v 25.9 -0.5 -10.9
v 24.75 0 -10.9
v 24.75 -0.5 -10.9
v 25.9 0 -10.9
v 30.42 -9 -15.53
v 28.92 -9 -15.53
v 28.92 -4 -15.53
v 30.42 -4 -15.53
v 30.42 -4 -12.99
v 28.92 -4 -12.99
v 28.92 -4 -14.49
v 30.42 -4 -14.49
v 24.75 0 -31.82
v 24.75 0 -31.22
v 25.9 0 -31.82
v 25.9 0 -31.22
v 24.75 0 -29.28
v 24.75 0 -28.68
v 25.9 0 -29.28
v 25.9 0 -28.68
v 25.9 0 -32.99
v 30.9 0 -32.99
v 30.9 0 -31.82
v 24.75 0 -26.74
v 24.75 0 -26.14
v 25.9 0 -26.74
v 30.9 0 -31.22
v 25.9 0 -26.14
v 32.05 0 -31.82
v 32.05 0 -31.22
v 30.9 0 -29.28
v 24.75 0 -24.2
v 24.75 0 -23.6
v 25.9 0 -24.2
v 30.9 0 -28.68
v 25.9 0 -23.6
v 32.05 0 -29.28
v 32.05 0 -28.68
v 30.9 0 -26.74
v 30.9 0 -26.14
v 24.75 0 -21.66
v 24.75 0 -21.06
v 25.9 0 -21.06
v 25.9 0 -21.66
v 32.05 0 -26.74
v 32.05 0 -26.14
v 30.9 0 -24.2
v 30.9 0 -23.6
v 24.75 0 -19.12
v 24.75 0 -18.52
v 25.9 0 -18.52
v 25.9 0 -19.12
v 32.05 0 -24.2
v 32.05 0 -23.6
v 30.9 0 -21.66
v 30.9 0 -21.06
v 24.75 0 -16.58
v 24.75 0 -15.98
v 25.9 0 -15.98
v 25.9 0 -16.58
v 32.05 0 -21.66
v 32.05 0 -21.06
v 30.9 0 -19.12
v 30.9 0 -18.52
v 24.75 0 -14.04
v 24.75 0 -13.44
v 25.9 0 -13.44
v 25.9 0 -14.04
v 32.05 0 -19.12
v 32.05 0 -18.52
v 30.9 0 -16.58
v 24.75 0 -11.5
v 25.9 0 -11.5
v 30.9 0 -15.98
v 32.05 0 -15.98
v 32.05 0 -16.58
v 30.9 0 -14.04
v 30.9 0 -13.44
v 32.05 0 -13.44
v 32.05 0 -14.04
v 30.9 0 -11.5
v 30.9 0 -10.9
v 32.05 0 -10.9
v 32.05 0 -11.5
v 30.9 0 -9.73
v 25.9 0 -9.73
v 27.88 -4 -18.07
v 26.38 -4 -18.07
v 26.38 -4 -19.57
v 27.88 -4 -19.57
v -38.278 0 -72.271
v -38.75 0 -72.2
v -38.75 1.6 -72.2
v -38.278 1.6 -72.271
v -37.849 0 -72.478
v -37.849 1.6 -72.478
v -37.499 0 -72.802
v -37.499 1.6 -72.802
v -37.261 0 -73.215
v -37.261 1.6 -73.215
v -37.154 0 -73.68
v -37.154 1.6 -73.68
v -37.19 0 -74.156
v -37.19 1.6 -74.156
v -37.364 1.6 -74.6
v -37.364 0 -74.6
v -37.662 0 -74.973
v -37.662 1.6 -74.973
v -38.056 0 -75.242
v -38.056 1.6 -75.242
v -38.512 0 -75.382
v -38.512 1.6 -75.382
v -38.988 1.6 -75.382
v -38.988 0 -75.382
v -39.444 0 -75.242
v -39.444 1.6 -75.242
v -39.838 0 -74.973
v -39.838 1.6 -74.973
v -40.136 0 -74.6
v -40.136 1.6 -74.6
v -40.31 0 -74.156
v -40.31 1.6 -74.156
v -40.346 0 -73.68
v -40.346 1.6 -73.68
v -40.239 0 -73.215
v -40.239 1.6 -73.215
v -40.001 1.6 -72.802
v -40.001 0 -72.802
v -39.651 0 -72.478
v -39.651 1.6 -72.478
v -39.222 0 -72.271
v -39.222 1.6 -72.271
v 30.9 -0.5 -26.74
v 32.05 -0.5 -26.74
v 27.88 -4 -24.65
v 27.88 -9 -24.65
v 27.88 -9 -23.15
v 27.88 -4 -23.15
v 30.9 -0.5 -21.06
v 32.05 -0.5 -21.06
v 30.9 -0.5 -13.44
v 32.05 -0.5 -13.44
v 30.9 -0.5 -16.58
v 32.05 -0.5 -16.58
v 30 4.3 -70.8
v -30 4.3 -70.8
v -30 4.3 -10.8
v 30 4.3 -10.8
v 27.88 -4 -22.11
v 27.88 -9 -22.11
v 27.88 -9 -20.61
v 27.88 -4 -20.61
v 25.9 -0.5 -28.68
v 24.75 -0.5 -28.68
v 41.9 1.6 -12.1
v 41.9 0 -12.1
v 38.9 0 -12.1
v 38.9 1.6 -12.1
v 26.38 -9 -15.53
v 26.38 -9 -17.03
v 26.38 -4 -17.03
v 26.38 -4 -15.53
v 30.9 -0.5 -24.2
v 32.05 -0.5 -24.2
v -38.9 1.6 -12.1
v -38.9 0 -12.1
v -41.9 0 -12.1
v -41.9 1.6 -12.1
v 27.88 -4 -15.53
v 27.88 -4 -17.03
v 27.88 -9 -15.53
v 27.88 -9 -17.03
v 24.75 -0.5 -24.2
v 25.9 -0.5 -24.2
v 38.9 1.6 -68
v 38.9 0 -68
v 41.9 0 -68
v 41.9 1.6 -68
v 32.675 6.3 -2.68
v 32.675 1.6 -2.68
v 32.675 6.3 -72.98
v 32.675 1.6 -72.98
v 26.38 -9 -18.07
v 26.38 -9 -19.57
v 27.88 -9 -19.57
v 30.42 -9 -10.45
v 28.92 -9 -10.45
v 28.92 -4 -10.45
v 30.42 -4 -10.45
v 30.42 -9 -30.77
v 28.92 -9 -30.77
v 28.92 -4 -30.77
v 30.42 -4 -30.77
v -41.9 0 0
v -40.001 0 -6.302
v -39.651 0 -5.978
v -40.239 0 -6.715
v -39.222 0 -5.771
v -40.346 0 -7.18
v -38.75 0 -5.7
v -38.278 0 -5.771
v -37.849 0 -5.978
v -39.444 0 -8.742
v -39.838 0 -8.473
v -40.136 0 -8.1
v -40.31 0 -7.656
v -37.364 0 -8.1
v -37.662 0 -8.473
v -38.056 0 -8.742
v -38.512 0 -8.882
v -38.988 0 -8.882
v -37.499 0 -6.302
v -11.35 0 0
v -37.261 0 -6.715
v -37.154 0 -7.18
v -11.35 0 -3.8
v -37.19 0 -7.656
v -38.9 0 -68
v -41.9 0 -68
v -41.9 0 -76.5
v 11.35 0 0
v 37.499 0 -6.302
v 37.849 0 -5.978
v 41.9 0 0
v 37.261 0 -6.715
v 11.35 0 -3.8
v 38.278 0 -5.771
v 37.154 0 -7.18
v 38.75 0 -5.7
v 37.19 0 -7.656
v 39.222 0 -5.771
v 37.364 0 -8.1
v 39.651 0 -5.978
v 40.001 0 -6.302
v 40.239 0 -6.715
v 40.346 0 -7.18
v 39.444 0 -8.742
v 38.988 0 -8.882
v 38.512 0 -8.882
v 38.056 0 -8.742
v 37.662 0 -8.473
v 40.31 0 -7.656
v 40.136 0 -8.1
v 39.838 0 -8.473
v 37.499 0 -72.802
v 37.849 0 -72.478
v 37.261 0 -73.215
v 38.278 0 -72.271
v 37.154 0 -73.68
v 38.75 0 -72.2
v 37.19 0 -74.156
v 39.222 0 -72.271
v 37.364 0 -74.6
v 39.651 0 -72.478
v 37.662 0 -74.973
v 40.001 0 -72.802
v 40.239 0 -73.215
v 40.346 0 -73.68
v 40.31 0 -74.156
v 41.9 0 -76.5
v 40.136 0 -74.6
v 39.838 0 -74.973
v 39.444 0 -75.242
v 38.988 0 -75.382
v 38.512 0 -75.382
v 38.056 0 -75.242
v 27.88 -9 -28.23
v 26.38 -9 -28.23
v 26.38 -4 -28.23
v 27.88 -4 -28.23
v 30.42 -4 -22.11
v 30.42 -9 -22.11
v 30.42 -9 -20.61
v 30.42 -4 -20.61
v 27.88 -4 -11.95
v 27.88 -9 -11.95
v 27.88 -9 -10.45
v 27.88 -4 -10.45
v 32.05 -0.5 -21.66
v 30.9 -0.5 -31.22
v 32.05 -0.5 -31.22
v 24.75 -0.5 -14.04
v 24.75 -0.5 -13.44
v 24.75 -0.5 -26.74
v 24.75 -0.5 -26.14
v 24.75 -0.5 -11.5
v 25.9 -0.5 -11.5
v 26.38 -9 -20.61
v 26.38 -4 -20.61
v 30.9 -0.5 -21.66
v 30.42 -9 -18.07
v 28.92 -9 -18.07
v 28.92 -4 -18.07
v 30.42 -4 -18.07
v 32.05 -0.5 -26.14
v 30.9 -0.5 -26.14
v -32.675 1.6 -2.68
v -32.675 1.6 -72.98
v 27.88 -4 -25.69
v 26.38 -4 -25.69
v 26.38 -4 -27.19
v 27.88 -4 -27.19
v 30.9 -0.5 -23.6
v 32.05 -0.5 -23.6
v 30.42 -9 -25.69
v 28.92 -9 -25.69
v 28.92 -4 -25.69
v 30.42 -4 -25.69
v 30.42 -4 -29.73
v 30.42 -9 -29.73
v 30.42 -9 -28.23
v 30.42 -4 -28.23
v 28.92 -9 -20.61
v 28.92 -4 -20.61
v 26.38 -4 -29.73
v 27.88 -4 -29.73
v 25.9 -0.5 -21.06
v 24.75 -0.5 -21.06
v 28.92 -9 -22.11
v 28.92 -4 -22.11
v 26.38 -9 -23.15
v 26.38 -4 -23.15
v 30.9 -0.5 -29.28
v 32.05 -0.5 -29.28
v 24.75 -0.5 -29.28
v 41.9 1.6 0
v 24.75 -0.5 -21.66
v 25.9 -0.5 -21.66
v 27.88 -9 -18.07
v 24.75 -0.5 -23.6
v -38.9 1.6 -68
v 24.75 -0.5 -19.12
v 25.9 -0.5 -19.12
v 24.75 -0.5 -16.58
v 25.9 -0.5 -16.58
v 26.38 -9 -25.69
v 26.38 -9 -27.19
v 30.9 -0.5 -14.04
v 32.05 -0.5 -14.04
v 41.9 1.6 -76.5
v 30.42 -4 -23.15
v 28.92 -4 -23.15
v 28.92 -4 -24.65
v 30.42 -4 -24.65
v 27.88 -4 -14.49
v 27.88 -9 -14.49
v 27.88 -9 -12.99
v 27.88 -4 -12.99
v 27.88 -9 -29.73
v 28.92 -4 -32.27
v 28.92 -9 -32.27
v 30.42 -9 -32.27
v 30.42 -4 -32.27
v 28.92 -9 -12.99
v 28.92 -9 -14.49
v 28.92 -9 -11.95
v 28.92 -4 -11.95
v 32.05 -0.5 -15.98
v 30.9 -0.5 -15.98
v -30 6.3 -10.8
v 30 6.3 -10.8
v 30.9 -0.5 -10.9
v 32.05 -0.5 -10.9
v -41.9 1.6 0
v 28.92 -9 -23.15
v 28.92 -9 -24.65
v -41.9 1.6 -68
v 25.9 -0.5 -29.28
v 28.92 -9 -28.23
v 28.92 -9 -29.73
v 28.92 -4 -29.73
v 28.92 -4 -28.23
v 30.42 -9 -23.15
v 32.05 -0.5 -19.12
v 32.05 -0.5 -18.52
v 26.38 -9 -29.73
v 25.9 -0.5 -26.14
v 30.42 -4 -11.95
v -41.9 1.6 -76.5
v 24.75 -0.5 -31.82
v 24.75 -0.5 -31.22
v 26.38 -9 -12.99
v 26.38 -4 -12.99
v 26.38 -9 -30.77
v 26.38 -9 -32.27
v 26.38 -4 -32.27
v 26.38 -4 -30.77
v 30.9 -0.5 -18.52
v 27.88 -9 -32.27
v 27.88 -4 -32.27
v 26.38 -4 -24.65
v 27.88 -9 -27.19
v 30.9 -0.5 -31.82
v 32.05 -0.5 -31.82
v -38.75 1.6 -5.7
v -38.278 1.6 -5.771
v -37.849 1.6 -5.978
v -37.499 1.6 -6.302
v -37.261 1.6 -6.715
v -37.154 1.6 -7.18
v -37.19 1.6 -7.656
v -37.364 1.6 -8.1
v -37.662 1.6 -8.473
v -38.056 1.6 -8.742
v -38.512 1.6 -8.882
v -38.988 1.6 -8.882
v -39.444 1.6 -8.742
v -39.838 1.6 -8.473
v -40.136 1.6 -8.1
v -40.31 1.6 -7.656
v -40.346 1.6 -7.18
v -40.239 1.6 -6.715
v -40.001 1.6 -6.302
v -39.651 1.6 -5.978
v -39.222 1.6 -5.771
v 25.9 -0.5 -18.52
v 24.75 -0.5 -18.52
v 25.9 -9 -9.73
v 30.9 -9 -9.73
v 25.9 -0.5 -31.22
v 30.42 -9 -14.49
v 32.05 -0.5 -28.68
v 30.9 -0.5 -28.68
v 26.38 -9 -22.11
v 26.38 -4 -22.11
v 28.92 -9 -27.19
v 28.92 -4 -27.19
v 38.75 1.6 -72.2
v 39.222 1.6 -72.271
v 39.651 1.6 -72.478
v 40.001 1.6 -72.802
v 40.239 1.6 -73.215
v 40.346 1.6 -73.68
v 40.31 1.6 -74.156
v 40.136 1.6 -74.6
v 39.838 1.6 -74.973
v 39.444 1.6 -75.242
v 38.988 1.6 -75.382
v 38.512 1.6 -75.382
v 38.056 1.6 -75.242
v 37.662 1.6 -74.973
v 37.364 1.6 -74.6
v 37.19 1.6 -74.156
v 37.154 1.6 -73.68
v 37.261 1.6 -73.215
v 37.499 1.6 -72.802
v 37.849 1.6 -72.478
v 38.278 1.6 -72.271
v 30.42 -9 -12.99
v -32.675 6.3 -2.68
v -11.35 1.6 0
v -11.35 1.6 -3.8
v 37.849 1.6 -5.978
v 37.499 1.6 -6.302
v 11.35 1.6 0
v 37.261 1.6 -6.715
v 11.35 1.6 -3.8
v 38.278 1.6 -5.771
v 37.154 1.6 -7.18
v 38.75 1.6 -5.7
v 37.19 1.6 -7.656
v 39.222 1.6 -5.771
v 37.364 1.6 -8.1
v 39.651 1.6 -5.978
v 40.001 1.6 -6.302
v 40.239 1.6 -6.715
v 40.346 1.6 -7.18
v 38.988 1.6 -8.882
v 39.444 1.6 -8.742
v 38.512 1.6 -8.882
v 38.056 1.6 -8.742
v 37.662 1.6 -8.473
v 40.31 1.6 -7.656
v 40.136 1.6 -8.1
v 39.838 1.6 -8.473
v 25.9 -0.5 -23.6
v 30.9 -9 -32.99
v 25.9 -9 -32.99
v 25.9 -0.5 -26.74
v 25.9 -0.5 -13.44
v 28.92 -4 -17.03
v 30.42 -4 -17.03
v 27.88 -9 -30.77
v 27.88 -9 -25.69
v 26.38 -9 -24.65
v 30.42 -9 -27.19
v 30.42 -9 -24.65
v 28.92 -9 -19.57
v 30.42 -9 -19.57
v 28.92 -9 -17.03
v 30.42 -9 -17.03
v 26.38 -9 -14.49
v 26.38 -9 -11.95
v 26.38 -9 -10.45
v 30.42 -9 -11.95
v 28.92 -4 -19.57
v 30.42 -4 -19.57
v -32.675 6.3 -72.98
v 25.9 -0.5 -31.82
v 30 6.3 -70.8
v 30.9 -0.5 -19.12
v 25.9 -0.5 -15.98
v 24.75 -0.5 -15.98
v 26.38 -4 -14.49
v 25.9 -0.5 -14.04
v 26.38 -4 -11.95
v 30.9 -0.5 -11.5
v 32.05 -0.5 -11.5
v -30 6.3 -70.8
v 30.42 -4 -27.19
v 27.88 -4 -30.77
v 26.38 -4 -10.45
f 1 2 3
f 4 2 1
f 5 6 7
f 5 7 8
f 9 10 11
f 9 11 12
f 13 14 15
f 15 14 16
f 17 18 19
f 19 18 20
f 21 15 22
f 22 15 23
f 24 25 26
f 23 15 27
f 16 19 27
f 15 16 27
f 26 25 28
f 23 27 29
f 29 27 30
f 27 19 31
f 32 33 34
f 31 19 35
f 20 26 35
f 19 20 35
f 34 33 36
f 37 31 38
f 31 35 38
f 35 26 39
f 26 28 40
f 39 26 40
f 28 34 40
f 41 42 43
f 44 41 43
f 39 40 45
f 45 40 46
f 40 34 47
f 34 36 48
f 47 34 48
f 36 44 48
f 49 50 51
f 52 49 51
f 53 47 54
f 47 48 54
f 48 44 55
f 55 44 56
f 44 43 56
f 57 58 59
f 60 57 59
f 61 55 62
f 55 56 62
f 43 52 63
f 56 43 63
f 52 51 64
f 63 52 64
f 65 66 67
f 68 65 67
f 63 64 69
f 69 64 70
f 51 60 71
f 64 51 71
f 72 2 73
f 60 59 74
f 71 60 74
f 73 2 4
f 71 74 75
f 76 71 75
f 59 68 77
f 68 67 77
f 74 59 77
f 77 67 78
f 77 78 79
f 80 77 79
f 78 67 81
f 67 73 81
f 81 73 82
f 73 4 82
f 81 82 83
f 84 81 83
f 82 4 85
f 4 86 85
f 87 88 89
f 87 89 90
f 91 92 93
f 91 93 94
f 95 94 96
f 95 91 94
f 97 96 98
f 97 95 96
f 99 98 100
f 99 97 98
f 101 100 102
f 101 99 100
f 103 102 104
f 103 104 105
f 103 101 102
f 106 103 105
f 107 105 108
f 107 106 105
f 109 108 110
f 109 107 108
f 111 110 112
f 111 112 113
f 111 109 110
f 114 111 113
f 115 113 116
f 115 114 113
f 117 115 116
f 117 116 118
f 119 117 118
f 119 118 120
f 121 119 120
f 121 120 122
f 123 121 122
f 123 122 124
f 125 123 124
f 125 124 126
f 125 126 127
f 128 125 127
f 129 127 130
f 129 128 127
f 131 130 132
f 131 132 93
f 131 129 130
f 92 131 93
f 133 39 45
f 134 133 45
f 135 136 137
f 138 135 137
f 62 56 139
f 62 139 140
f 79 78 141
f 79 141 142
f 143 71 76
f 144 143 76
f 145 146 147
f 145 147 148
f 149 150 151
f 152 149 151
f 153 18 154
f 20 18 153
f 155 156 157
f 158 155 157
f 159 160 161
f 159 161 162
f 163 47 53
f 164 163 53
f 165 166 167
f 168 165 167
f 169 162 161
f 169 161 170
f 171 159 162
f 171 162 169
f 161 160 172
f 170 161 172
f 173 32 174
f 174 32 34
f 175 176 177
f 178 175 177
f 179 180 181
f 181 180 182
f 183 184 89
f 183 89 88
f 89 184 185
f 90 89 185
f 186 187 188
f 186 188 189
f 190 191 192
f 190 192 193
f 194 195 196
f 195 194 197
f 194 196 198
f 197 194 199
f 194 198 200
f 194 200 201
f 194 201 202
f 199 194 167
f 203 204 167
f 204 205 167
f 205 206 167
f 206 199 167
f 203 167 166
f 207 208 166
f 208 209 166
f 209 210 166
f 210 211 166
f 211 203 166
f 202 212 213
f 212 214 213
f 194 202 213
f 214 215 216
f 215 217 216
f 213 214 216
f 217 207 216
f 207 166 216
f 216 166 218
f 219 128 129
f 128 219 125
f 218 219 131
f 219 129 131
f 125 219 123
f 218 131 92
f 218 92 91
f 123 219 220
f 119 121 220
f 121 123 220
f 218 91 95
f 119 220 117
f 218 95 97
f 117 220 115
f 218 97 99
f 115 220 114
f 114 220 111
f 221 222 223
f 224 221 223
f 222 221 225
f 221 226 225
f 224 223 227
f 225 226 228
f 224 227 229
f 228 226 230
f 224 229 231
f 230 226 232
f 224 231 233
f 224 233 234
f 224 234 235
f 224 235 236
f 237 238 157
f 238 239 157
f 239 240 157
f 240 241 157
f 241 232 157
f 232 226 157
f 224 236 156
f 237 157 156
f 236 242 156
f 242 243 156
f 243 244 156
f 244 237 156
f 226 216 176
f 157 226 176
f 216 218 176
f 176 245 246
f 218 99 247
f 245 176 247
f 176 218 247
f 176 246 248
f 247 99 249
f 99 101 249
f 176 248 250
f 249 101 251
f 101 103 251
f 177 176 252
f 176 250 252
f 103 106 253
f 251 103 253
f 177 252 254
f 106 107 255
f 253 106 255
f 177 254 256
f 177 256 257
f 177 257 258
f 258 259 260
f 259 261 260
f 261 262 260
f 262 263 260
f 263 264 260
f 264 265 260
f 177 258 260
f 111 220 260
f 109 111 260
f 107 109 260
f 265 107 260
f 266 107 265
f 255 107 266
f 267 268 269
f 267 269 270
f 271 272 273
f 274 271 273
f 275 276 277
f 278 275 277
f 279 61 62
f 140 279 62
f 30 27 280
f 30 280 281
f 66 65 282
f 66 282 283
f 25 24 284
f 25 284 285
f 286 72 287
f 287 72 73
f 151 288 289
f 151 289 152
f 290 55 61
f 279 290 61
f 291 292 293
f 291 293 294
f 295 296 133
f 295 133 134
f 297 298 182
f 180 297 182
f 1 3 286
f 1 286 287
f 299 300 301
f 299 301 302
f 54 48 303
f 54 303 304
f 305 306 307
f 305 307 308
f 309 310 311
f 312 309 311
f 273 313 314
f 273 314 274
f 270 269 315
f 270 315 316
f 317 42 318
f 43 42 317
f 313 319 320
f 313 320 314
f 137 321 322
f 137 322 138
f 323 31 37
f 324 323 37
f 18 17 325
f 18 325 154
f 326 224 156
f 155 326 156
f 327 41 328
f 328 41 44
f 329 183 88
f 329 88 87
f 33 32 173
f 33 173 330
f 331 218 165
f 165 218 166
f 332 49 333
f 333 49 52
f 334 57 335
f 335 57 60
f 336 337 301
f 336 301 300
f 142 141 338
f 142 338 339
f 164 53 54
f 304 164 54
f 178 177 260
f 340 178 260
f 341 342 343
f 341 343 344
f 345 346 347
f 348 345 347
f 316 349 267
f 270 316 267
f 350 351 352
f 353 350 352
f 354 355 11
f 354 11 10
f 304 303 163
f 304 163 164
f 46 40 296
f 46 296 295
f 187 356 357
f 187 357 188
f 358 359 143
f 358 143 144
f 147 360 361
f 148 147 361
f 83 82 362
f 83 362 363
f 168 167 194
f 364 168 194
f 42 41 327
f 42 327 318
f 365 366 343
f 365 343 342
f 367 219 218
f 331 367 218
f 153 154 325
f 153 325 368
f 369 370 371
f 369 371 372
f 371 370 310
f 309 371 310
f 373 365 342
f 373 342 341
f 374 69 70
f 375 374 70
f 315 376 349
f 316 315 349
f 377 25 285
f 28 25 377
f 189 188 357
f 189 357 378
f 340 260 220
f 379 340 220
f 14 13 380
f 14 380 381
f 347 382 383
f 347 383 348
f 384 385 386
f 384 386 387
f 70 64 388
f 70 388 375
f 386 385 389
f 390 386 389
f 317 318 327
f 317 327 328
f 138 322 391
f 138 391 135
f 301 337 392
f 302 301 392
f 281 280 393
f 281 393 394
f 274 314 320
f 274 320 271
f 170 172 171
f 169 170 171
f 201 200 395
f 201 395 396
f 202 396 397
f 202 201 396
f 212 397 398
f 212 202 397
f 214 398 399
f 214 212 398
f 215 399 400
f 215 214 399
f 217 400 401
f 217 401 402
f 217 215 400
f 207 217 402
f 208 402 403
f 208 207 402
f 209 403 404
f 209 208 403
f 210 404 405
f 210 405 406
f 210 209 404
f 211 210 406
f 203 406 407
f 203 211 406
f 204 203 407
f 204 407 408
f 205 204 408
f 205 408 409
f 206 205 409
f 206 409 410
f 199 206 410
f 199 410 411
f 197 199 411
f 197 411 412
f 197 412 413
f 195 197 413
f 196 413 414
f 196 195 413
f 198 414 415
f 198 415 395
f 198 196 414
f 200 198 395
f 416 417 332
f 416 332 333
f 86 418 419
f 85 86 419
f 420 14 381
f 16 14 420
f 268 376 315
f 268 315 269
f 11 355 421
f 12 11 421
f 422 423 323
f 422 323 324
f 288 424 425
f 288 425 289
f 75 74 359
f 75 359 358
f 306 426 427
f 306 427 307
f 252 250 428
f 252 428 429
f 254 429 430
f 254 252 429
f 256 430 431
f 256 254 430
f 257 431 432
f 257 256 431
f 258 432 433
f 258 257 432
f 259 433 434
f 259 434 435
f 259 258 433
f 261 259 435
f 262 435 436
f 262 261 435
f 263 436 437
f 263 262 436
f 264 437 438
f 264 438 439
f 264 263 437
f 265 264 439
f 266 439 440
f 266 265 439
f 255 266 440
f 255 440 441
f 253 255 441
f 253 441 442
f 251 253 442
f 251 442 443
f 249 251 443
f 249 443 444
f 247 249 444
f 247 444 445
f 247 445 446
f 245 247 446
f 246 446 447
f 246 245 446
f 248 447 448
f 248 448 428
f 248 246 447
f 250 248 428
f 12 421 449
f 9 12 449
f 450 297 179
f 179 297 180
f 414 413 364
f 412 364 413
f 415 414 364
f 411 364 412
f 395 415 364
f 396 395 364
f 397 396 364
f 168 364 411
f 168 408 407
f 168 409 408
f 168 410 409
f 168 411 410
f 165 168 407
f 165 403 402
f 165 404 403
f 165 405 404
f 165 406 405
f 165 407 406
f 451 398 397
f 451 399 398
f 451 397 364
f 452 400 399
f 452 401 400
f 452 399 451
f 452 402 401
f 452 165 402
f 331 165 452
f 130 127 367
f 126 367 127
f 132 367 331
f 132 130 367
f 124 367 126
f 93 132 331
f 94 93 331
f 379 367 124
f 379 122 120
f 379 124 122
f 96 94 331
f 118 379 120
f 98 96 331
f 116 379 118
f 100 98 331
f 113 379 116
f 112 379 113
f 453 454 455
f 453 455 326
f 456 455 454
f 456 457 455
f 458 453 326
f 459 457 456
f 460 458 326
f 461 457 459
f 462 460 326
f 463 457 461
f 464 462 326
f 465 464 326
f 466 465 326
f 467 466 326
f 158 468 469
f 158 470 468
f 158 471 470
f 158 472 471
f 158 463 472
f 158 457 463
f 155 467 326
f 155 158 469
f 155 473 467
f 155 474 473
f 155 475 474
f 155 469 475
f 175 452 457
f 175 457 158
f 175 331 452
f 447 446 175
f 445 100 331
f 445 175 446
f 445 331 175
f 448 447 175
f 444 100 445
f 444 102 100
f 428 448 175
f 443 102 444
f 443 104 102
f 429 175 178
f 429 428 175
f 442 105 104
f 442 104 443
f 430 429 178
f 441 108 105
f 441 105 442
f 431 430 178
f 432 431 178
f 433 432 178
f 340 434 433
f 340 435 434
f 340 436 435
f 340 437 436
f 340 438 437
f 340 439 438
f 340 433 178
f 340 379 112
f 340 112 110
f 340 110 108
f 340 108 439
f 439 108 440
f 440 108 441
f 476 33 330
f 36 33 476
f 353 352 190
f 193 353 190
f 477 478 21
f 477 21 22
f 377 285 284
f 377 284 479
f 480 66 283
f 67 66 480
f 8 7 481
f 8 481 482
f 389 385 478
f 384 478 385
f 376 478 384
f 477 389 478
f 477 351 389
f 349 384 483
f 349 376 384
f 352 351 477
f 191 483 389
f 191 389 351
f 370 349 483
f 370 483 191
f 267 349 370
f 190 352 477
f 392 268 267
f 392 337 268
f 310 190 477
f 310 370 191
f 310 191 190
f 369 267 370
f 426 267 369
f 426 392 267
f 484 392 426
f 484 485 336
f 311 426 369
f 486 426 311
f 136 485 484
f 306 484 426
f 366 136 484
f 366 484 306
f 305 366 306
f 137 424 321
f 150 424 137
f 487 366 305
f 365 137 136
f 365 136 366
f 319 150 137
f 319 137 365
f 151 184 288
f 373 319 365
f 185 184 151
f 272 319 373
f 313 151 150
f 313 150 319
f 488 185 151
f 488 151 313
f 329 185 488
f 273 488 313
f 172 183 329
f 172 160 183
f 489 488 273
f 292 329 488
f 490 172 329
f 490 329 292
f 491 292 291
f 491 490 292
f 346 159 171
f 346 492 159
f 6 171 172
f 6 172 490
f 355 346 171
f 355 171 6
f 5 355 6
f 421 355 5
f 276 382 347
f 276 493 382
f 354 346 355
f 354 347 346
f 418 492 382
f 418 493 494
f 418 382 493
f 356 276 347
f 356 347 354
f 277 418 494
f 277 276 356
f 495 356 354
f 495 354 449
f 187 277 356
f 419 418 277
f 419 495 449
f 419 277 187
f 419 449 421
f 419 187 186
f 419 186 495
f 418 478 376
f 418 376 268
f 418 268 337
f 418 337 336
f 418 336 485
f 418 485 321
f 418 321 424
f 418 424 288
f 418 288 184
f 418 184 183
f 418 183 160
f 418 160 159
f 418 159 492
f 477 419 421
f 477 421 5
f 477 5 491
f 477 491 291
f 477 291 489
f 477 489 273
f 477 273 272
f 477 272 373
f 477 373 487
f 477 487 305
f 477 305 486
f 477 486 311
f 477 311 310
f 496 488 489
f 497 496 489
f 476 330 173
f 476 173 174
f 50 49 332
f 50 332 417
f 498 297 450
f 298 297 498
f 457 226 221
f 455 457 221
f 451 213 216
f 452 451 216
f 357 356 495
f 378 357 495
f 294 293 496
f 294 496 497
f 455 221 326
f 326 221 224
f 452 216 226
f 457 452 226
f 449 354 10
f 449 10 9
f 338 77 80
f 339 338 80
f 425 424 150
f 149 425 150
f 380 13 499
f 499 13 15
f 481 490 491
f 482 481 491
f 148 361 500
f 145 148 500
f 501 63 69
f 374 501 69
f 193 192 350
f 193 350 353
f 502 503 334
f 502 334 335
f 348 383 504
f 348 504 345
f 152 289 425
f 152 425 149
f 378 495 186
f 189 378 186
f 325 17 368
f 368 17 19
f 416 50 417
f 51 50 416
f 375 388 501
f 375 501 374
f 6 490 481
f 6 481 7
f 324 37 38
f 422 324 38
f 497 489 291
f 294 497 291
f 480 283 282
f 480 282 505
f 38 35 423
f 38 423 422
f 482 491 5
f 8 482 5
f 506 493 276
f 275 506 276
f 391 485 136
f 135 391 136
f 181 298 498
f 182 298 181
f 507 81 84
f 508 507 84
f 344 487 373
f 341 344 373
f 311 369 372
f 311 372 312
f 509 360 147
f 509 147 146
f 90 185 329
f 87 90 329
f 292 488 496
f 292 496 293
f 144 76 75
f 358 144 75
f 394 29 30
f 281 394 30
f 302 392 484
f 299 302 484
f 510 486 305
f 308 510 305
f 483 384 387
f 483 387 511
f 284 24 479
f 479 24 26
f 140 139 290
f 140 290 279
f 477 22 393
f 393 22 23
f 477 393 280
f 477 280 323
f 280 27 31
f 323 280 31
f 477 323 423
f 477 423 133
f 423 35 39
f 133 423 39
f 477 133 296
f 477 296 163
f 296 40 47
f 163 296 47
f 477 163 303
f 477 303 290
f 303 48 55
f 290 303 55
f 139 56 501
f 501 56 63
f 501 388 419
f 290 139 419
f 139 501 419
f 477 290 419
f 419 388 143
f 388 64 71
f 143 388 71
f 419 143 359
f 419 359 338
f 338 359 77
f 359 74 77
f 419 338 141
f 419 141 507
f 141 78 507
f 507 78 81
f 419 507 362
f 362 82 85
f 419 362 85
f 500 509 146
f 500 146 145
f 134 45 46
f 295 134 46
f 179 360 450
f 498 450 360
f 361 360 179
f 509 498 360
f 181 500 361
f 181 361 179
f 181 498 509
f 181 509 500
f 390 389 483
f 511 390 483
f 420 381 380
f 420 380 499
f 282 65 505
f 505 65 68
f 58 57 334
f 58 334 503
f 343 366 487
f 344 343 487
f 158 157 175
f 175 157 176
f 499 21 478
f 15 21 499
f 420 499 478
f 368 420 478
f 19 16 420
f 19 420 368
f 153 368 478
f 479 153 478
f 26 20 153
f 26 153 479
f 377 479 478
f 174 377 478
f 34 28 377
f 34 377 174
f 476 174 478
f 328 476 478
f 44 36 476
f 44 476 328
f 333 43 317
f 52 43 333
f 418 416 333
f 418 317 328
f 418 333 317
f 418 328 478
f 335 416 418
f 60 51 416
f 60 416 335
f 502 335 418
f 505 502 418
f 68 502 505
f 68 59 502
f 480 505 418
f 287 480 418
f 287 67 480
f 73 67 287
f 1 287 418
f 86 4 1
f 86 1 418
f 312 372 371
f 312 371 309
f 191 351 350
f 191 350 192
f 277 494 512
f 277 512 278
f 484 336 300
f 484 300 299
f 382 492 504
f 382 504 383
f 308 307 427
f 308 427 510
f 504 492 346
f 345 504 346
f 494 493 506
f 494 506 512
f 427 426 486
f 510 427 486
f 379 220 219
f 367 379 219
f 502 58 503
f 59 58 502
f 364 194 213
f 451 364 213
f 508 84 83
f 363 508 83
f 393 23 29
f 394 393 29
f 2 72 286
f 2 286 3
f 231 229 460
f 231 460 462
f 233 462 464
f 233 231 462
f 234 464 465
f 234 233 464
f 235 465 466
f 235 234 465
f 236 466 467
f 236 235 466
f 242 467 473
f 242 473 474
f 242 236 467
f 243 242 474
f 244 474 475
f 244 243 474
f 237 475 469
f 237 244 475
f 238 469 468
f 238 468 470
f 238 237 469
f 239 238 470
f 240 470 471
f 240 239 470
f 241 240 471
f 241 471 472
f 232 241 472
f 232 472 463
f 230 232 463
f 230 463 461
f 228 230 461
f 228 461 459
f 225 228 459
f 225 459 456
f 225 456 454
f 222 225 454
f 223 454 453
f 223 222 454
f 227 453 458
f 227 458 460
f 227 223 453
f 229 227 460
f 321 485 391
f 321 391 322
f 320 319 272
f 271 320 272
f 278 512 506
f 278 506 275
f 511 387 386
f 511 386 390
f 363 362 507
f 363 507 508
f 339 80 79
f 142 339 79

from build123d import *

# Parameters (mm, degrees)
SKETCH_1_R          = 1.6
EXTRUDE_1_DEPTH     = 1.6
EXTRUDE_START       = 1.6
SKETCH_1_3_W        = 65.35
SKETCH_1_3_H        = 70.3
EXTRUDE_2_DEPTH     = 4.7
CUT_EXTRUDE_START   = 6.3
SKETCH_1_4_W        = 60
SKETCH_1_4_H        = 60
CUT_EXTRUDE_1_DEPTH = 2
SKETCH_2_W          = 5
SKETCH_2_H          = 23.26
EXTRUDE_3_DEPTH     = 9
SKETCH_2_3_W        = 1.15
SKETCH_2_3_H        = 0.6
EXTRUDE_4_DEPTH     = 0.5
CUT_EXTRUDE_START_2 = 9
SKETCH_2_4_W        = 1.5
SKETCH_2_4_H        = 1.5
CUT_EXTRUDE_2_DEPTH = 5


with BuildPart() as part:
    # 草图1 → 凸台-拉伸1 (new body)
    with BuildSketch(Plane(origin=(0, 0, 0), x_dir=(1, 0, 0), z_dir=(0, 1, 0))):
        Polygon((-41.9, 76.5), (-41.9, 68), (-38.9, 68), (-38.9, 12.1), (-41.9, 12.1), (-41.9, 0), (-11.35, 0), (-11.35, 3.8), (11.35, 3.8), (11.35, 0), (41.9, 0), (41.9, 12.1), (38.9, 12.1), (38.9, 68), (41.9, 68), (41.9, 76.5), align=None)
        with Locations(Location((-38.75, 73.8, 0), (0, 0, 270))):
            Circle(SKETCH_1_R, mode=Mode.SUBTRACT)
        with Locations(Location((38.75, 73.8, 0), (0, 0, 270))):
            Circle(SKETCH_1_R, mode=Mode.SUBTRACT)
        with Locations(Location((38.75, 7.3, 0), (0, 0, 270))):
            Circle(SKETCH_1_R, mode=Mode.SUBTRACT)
        with Locations(Location((-38.75, 7.3, 0), (0, 0, 270))):
            Circle(SKETCH_1_R, mode=Mode.SUBTRACT)
    extrude(amount=EXTRUDE_1_DEPTH)


with BuildPart() as body_2:
    # 草图1<3> → 凸台-拉伸2 (new body)
    with BuildSketch(Plane(origin=(0, 0, 0), x_dir=(1, 0, 0), z_dir=(0, 1, 0)).offset(EXTRUDE_START)):
        with Locations((0, 37.83)):
            Rectangle(SKETCH_1_3_W, SKETCH_1_3_H)
    extrude(amount=EXTRUDE_2_DEPTH)

    # 草图1<4> → 切除-拉伸1 (cut)
    with BuildSketch(Plane(origin=(0, 0, 0), x_dir=(1, 0, 0), z_dir=(0, 1, 0)).offset(CUT_EXTRUDE_START)):
        with Locations((0, 40.8)):
            Rectangle(SKETCH_1_4_W, SKETCH_1_4_H)
    extrude(amount=-CUT_EXTRUDE_1_DEPTH, mode=Mode.SUBTRACT)


with BuildPart() as body_3:
    # 草图2 → 凸台-拉伸3 (new body)
    with BuildSketch(Plane.XZ):
        with Locations((28.4, -21.36)):
            Rectangle(SKETCH_2_W, SKETCH_2_H)
    extrude(amount=EXTRUDE_3_DEPTH)

    # 草图2<3> → 凸台-拉伸4 (add)
    with BuildSketch(Plane.XZ):
        with Locations((31.475, -13.74)):
            Rectangle(SKETCH_2_3_W, SKETCH_2_3_H)
        with Locations((31.475, -11.2)):
            Rectangle(SKETCH_2_3_W, SKETCH_2_3_H)
        with Locations((31.475, -16.28)):
            Rectangle(SKETCH_2_3_W, SKETCH_2_3_H)
        with Locations((31.475, -18.82)):
            Rectangle(SKETCH_2_3_W, SKETCH_2_3_H)
        with Locations((31.475, -21.36)):
            Rectangle(SKETCH_2_3_W, SKETCH_2_3_H)
        with Locations((31.475, -23.9)):
            Rectangle(SKETCH_2_3_W, SKETCH_2_3_H)
        with Locations((31.475, -26.44)):
            Rectangle(SKETCH_2_3_W, SKETCH_2_3_H)
        with Locations((31.475, -28.98)):
            Rectangle(SKETCH_2_3_W, SKETCH_2_3_H)
        with Locations((31.475, -31.52)):
            Rectangle(SKETCH_2_3_W, SKETCH_2_3_H)
        with Locations((25.325, -31.52)):
            Rectangle(SKETCH_2_3_W, SKETCH_2_3_H)
        with Locations((25.325, -28.98)):
            Rectangle(SKETCH_2_3_W, SKETCH_2_3_H)
        with Locations((25.325, -26.44)):
            Rectangle(SKETCH_2_3_W, SKETCH_2_3_H)
        with Locations((25.325, -23.9)):
            Rectangle(SKETCH_2_3_W, SKETCH_2_3_H)
        with Locations((25.325, -21.36)):
            Rectangle(SKETCH_2_3_W, SKETCH_2_3_H)
        with Locations((25.325, -18.82)):
            Rectangle(SKETCH_2_3_W, SKETCH_2_3_H)
        with Locations((25.325, -16.28)):
            Rectangle(SKETCH_2_3_W, SKETCH_2_3_H)
        with Locations((25.325, -13.74)):
            Rectangle(SKETCH_2_3_W, SKETCH_2_3_H)
        with Locations((25.325, -11.2)):
            Rectangle(SKETCH_2_3_W, SKETCH_2_3_H)
    extrude(amount=EXTRUDE_4_DEPTH)

    # 草图2<4> → 切除-拉伸2 (cut)
    with BuildSketch(Plane.XZ.offset(CUT_EXTRUDE_START_2)):
        with Locations((29.67, -11.2)):
            Rectangle(SKETCH_2_4_W, SKETCH_2_4_H)
        with Locations((27.13, -11.2)):
            Rectangle(SKETCH_2_4_W, SKETCH_2_4_H)
        with Locations((27.13, -13.74)):
            Rectangle(SKETCH_2_4_W, SKETCH_2_4_H)
        with Locations((29.67, -13.74)):
            Rectangle(SKETCH_2_4_W, SKETCH_2_4_H)
        with Locations((27.13, -16.28)):
            Rectangle(SKETCH_2_4_W, SKETCH_2_4_H)
        with Locations((29.67, -16.28)):
            Rectangle(SKETCH_2_4_W, SKETCH_2_4_H)
        with Locations((27.13, -18.82)):
            Rectangle(SKETCH_2_4_W, SKETCH_2_4_H)
        with Locations((29.67, -18.82)):
            Rectangle(SKETCH_2_4_W, SKETCH_2_4_H)
        with Locations((27.13, -21.36)):
            Rectangle(SKETCH_2_4_W, SKETCH_2_4_H)
        with Locations((29.67, -21.36)):
            Rectangle(SKETCH_2_4_W, SKETCH_2_4_H)
        with Locations((27.13, -23.9)):
            Rectangle(SKETCH_2_4_W, SKETCH_2_4_H)
        with Locations((29.67, -23.9)):
            Rectangle(SKETCH_2_4_W, SKETCH_2_4_H)
        with Locations((27.13, -26.44)):
            Rectangle(SKETCH_2_4_W, SKETCH_2_4_H)
        with Locations((29.67, -26.44)):
            Rectangle(SKETCH_2_4_W, SKETCH_2_4_H)
        with Locations((27.13, -28.98)):
            Rectangle(SKETCH_2_4_W, SKETCH_2_4_H)
        with Locations((29.67, -28.98)):
            Rectangle(SKETCH_2_4_W, SKETCH_2_4_H)
        with Locations((27.13, -31.52)):
            Rectangle(SKETCH_2_4_W, SKETCH_2_4_H)
        with Locations((29.67, -31.52)):
            Rectangle(SKETCH_2_4_W, SKETCH_2_4_H)
    extrude(amount=-CUT_EXTRUDE_2_DEPTH, mode=Mode.SUBTRACT)


solid = Compound([part.part, body_2.part, body_3.part])
